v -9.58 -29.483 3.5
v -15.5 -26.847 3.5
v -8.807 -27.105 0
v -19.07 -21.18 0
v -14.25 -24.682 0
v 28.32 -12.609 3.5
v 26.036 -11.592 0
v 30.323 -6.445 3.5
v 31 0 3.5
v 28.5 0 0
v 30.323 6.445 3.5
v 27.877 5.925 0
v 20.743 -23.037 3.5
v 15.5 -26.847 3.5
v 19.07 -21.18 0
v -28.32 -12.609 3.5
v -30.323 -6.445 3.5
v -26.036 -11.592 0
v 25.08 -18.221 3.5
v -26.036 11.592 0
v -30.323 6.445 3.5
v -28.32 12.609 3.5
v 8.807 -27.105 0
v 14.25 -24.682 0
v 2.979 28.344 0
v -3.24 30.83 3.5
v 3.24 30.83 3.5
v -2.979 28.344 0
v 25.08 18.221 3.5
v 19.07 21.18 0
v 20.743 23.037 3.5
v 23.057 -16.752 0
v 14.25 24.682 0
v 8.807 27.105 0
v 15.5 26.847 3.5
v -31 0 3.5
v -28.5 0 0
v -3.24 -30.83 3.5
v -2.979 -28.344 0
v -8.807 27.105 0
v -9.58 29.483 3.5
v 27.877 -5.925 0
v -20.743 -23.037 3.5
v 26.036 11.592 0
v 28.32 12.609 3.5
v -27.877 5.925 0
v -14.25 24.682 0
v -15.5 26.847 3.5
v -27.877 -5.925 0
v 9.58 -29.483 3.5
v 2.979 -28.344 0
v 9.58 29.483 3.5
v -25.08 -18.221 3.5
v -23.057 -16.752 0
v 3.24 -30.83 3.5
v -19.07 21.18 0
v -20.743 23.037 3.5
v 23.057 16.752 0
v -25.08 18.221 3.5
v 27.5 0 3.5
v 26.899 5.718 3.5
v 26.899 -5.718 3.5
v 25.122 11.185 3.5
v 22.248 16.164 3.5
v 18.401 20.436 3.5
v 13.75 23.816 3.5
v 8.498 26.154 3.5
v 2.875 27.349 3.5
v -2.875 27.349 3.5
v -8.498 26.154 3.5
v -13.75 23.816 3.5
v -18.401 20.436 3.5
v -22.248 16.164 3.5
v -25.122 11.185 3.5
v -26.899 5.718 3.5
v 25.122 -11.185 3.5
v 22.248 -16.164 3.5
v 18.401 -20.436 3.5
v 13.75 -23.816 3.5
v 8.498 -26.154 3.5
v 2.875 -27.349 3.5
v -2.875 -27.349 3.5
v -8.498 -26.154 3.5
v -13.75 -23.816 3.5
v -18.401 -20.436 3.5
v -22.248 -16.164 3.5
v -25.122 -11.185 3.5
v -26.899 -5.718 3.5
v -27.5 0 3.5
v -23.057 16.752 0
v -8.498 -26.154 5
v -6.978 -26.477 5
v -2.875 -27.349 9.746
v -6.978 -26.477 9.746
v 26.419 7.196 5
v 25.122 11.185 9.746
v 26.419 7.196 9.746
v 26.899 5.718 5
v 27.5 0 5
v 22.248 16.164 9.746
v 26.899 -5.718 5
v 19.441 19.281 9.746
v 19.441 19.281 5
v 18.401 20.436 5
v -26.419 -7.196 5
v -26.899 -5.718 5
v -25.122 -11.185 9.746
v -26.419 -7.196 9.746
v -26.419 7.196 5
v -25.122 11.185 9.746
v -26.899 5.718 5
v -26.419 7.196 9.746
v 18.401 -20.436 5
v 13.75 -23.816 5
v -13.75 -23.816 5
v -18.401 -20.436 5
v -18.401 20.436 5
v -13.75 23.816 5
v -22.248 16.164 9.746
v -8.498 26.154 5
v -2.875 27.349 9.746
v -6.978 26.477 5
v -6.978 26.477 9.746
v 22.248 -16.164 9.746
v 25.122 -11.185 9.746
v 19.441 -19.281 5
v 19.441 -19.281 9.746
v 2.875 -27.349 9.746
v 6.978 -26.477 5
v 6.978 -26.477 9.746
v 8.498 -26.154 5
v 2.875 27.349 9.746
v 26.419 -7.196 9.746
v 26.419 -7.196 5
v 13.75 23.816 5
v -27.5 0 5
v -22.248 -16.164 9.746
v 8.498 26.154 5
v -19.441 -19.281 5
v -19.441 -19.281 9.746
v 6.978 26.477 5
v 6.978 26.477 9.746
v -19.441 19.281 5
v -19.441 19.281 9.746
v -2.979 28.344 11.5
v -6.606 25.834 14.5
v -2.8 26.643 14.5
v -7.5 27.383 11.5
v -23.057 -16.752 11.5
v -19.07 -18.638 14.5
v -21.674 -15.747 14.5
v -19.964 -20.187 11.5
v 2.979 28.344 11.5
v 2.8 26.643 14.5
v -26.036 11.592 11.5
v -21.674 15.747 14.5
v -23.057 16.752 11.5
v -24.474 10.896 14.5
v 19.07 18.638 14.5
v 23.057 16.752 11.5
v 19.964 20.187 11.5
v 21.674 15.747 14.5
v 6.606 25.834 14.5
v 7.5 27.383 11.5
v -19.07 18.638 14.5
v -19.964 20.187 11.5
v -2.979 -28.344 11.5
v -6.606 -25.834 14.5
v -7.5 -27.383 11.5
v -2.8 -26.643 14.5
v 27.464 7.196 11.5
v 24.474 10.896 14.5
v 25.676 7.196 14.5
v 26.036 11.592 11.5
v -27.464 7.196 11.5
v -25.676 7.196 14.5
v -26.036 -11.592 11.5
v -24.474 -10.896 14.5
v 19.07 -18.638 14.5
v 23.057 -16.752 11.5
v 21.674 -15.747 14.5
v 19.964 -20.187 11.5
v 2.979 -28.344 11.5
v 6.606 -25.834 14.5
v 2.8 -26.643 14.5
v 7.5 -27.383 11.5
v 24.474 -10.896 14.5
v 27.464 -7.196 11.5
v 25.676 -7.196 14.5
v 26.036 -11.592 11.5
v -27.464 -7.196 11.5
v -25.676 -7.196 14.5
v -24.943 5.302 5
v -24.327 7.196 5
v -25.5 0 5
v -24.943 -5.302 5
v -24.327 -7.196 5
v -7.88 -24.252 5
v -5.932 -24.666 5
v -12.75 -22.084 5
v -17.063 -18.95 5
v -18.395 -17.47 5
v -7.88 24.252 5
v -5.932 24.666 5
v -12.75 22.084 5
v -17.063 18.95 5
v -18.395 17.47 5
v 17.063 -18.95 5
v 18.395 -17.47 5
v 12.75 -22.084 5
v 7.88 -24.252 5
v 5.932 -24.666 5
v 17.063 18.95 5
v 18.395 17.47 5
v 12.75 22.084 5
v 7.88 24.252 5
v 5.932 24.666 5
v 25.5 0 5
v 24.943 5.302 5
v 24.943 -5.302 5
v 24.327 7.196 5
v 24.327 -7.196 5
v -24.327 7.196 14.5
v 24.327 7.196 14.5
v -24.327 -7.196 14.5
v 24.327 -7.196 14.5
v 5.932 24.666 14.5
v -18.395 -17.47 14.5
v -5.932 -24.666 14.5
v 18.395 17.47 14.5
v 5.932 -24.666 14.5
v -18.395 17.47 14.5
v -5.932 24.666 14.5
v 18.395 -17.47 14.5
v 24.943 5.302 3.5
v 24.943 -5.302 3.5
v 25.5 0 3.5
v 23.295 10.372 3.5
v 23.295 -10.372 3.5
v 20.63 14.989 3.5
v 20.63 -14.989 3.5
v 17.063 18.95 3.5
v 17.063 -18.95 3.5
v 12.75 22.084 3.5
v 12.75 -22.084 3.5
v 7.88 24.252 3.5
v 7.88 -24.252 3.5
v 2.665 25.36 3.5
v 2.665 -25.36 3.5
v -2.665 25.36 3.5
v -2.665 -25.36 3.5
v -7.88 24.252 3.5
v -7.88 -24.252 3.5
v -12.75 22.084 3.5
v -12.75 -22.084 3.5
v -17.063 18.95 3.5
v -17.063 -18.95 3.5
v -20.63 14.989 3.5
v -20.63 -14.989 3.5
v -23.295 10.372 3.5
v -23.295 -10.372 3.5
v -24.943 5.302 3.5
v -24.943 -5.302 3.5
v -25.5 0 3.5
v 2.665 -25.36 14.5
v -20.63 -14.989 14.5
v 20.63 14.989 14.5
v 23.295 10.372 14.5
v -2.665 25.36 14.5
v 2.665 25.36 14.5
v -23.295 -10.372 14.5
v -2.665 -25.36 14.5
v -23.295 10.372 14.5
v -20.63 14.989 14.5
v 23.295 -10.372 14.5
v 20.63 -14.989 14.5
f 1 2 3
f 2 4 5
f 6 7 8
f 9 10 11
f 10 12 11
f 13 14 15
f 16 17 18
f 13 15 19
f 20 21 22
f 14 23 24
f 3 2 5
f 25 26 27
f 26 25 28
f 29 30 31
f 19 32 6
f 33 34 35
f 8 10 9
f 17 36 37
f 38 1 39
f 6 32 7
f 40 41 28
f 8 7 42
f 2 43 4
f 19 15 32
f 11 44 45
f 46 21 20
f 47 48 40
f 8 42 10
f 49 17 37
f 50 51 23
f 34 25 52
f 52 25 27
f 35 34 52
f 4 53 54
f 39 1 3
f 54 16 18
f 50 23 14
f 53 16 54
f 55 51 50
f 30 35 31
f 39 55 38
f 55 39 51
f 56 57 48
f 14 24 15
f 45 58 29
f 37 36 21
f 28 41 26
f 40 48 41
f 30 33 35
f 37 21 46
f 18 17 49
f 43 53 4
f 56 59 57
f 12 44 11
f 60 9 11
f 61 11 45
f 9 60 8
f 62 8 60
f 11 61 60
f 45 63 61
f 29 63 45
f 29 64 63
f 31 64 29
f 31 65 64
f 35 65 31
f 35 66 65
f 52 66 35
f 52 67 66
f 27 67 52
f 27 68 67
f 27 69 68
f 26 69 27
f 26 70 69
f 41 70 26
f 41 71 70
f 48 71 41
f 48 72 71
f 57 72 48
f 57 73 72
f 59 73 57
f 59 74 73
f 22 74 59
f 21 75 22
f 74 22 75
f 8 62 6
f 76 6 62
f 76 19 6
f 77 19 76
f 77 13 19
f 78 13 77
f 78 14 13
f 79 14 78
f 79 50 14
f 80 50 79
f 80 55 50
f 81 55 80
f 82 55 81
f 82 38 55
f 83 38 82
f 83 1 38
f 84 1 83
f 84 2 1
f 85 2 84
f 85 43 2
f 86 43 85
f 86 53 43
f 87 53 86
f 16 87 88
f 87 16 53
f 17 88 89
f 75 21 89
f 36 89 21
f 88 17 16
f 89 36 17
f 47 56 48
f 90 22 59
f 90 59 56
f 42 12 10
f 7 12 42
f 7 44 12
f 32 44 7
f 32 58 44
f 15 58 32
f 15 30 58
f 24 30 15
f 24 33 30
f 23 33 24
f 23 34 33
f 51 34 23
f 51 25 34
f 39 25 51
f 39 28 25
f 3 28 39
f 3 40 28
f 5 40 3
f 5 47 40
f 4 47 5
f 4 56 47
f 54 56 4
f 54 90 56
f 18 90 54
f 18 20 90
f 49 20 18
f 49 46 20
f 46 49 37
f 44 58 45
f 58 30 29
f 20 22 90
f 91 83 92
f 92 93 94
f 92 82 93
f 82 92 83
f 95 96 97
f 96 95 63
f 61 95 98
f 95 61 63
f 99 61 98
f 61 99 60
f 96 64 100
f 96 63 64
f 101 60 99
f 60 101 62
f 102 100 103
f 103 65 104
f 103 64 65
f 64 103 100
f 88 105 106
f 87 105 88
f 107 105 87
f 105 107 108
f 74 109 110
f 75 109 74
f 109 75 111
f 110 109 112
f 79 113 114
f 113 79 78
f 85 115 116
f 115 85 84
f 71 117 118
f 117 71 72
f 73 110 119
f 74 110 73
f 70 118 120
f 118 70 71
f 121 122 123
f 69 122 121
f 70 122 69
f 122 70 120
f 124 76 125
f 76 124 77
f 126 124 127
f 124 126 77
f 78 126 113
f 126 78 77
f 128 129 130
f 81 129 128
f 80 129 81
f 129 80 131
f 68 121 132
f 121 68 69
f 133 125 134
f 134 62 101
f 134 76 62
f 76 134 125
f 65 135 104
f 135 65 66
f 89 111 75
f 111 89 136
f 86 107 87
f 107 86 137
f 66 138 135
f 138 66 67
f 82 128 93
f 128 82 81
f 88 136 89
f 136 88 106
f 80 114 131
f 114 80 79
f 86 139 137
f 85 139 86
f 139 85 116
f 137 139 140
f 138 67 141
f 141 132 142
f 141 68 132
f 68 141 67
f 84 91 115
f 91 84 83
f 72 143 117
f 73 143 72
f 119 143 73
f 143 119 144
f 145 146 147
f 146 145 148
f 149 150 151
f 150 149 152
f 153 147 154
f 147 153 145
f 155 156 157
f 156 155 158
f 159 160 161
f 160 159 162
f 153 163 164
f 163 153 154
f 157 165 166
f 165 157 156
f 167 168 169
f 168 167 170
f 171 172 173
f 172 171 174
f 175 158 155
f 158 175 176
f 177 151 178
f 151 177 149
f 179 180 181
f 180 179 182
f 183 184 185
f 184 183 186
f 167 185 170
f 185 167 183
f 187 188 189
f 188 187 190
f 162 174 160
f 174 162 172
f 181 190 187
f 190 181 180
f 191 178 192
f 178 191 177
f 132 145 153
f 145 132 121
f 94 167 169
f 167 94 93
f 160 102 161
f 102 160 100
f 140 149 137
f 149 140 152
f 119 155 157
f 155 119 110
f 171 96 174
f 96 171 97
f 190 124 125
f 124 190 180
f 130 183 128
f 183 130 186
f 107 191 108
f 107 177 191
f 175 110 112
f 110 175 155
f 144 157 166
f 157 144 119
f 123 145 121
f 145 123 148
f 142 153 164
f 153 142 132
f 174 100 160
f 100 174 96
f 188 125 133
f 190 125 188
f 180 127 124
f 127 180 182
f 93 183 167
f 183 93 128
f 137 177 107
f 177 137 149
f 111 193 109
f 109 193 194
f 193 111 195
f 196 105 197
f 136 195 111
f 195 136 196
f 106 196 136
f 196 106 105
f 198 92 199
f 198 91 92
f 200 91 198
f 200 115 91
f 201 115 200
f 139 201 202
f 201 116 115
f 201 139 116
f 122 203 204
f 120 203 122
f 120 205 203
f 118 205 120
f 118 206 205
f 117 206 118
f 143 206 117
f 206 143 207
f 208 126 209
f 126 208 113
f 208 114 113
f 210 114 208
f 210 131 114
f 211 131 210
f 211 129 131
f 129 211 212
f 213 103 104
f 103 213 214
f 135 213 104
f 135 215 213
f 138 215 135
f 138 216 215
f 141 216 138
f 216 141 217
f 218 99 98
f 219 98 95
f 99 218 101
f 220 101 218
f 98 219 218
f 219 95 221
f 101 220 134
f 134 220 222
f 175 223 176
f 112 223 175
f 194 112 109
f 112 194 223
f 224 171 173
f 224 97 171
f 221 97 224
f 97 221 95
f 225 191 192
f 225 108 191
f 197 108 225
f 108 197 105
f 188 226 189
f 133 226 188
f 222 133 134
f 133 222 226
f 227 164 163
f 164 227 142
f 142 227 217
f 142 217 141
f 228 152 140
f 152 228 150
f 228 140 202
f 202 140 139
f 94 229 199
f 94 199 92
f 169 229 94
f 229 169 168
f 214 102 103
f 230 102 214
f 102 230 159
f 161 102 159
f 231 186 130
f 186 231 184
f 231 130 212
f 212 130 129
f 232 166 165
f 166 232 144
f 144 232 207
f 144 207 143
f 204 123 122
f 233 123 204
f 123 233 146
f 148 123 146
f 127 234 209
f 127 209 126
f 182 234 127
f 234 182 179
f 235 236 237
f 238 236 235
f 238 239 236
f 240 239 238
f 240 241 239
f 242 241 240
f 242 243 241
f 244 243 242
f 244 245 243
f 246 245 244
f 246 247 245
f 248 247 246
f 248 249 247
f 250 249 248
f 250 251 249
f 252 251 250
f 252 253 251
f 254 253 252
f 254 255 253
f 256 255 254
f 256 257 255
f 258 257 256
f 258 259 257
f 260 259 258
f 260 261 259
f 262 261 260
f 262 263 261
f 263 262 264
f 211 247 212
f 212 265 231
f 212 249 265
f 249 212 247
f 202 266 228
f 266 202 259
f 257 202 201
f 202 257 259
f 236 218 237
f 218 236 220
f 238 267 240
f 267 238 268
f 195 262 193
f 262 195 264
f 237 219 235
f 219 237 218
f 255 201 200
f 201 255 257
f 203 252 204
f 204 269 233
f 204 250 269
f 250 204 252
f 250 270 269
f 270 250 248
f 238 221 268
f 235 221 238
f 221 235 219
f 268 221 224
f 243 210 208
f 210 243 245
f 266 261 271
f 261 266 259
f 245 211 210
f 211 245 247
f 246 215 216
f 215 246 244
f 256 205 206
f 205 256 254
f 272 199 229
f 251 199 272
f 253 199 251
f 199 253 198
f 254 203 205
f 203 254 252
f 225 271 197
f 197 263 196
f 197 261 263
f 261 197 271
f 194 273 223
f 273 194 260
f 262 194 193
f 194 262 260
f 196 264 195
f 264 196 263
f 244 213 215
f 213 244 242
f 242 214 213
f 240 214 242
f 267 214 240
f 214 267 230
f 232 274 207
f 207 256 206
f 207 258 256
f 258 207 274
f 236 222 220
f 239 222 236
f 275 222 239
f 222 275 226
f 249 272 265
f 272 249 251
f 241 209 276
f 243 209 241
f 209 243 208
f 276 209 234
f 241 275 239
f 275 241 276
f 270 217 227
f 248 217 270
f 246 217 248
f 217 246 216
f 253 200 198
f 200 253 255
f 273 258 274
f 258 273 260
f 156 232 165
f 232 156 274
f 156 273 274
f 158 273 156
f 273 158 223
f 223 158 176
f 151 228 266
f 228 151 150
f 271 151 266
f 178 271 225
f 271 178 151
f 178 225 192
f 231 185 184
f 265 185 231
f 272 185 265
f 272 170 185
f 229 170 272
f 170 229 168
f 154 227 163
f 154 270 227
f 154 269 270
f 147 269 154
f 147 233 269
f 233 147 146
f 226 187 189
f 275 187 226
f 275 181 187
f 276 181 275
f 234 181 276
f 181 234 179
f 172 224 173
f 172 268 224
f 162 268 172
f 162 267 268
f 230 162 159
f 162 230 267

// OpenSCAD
//Edit these parameters
diameter_inner = 55;    //Inner diameter of plugging hole from 10 - 98
wall_thickness = 4;     //Keep this to a sane value for good flex
tap_hight = 8;          //How far inn is the groove?
emblem_hight= 3.5;      //How thick do you want it?
faces = 30;             //how smooth do you want it?
clipthickness = 2;      //How deep is your groove?
tapsmooth = 50;         //How sharp angle do you want on your tap
clipnumbers = 6;        //Keep to even numbers
autoclipspace = ((diameter_inner * 3.14)/clipnumbers)/2;//math
clipspace = autoclipspace;//Can be replaced with guesswork.
emblem_inner = diameter_inner + 7; //Brimsize close to the hole.   
emblem_outer = diameter_inner + 2; //Brimsize close to the bottom.


//math to make scaling work.
insight_cut= diameter_inner - wall_thickness;
tap_hight_from_0 = tap_hight + emblem_hight;
total_hight = tap_hight_from_0 + 5;
clipwide = diameter_inner + clipthickness;
cylindertop = tap_hight_from_0;
cylinderbottom =  cylindertop - tapsmooth;
cutouthight = tapsmooth;
topcut = 50 + tap_hight_from_0 + 3;
block_nr = clipnumbers;
blockangle = 360 / block_nr;
audidiameter = (emblem_outer/4)/2;
ringthickness = 1* diameter_inner/60;

//Module for audi logo.
module audiring (diameter= 60, offset= 0)  {
    translate([offset,0,0]){
        rotate_extrude(convexity=10,$fn=faces)
        translate([diameter,0,0])
        circle(r=ringthickness,$fn=faces);
    }
}


difference() {
    //Basic shape
    union() {
    // Cone, face
    cylinder(d2=emblem_inner, d1=emblem_outer, h=emblem_hight, $fn=faces );
    // Cylinder, interior clip
    cylinder(d=diameter_inner, h=tap_hight_from_0);
        
    // upper wedge on clip
    translate(v=[0,0,cylindertop])
    cylinder(d2=0, d1=clipwide, h=tapsmooth);
    // lower wedge on clip
    translate(v=[0,0,cylinderbottom])
    cylinder(d1=0, d2=clipwide, h=tapsmooth);  
        



    };
    //***** Comment out if you have audi ;)*****
    //******************************************
    //audiring (audidiameter, emblem_outer/12);
    //audiring (audidiameter, emblem_outer/4);
    //audiring (audidiameter, -emblem_outer/12);
    //audiring (audidiameter, -emblem_outer/4);
    //******************************************
    
    //************ Text example ****************
    //******************************************
    //translate([20, -emblem_outer/3, 0])
    //mirror([1,0,0]){
    //linear_extrude(0.4)
    //    text("TEXT-Example", size = 4);
    //}
    //******************************************
    
    
    // Cut out the interior of interior clip
    translate(v=[0,0,emblem_hight])
        cylinder( d=insight_cut, h=cutouthight);
    // Slice off top and bottom of the cap
    translate([0,0,-50])
        cube(center=true,[clipwide,clipwide,100]);
    translate([0,0,topcut])
        cube(center=true,[clipwide,clipwide,100]);
    
    
    //Function for getting scalable clip's
        for( i = [0:block_nr]) {
        rotate(a=[0,0,blockangle*i])
            translate([0, 0, 30])
                cube(center=true,[100, clipspace, 50]);
            
    };
       
}
